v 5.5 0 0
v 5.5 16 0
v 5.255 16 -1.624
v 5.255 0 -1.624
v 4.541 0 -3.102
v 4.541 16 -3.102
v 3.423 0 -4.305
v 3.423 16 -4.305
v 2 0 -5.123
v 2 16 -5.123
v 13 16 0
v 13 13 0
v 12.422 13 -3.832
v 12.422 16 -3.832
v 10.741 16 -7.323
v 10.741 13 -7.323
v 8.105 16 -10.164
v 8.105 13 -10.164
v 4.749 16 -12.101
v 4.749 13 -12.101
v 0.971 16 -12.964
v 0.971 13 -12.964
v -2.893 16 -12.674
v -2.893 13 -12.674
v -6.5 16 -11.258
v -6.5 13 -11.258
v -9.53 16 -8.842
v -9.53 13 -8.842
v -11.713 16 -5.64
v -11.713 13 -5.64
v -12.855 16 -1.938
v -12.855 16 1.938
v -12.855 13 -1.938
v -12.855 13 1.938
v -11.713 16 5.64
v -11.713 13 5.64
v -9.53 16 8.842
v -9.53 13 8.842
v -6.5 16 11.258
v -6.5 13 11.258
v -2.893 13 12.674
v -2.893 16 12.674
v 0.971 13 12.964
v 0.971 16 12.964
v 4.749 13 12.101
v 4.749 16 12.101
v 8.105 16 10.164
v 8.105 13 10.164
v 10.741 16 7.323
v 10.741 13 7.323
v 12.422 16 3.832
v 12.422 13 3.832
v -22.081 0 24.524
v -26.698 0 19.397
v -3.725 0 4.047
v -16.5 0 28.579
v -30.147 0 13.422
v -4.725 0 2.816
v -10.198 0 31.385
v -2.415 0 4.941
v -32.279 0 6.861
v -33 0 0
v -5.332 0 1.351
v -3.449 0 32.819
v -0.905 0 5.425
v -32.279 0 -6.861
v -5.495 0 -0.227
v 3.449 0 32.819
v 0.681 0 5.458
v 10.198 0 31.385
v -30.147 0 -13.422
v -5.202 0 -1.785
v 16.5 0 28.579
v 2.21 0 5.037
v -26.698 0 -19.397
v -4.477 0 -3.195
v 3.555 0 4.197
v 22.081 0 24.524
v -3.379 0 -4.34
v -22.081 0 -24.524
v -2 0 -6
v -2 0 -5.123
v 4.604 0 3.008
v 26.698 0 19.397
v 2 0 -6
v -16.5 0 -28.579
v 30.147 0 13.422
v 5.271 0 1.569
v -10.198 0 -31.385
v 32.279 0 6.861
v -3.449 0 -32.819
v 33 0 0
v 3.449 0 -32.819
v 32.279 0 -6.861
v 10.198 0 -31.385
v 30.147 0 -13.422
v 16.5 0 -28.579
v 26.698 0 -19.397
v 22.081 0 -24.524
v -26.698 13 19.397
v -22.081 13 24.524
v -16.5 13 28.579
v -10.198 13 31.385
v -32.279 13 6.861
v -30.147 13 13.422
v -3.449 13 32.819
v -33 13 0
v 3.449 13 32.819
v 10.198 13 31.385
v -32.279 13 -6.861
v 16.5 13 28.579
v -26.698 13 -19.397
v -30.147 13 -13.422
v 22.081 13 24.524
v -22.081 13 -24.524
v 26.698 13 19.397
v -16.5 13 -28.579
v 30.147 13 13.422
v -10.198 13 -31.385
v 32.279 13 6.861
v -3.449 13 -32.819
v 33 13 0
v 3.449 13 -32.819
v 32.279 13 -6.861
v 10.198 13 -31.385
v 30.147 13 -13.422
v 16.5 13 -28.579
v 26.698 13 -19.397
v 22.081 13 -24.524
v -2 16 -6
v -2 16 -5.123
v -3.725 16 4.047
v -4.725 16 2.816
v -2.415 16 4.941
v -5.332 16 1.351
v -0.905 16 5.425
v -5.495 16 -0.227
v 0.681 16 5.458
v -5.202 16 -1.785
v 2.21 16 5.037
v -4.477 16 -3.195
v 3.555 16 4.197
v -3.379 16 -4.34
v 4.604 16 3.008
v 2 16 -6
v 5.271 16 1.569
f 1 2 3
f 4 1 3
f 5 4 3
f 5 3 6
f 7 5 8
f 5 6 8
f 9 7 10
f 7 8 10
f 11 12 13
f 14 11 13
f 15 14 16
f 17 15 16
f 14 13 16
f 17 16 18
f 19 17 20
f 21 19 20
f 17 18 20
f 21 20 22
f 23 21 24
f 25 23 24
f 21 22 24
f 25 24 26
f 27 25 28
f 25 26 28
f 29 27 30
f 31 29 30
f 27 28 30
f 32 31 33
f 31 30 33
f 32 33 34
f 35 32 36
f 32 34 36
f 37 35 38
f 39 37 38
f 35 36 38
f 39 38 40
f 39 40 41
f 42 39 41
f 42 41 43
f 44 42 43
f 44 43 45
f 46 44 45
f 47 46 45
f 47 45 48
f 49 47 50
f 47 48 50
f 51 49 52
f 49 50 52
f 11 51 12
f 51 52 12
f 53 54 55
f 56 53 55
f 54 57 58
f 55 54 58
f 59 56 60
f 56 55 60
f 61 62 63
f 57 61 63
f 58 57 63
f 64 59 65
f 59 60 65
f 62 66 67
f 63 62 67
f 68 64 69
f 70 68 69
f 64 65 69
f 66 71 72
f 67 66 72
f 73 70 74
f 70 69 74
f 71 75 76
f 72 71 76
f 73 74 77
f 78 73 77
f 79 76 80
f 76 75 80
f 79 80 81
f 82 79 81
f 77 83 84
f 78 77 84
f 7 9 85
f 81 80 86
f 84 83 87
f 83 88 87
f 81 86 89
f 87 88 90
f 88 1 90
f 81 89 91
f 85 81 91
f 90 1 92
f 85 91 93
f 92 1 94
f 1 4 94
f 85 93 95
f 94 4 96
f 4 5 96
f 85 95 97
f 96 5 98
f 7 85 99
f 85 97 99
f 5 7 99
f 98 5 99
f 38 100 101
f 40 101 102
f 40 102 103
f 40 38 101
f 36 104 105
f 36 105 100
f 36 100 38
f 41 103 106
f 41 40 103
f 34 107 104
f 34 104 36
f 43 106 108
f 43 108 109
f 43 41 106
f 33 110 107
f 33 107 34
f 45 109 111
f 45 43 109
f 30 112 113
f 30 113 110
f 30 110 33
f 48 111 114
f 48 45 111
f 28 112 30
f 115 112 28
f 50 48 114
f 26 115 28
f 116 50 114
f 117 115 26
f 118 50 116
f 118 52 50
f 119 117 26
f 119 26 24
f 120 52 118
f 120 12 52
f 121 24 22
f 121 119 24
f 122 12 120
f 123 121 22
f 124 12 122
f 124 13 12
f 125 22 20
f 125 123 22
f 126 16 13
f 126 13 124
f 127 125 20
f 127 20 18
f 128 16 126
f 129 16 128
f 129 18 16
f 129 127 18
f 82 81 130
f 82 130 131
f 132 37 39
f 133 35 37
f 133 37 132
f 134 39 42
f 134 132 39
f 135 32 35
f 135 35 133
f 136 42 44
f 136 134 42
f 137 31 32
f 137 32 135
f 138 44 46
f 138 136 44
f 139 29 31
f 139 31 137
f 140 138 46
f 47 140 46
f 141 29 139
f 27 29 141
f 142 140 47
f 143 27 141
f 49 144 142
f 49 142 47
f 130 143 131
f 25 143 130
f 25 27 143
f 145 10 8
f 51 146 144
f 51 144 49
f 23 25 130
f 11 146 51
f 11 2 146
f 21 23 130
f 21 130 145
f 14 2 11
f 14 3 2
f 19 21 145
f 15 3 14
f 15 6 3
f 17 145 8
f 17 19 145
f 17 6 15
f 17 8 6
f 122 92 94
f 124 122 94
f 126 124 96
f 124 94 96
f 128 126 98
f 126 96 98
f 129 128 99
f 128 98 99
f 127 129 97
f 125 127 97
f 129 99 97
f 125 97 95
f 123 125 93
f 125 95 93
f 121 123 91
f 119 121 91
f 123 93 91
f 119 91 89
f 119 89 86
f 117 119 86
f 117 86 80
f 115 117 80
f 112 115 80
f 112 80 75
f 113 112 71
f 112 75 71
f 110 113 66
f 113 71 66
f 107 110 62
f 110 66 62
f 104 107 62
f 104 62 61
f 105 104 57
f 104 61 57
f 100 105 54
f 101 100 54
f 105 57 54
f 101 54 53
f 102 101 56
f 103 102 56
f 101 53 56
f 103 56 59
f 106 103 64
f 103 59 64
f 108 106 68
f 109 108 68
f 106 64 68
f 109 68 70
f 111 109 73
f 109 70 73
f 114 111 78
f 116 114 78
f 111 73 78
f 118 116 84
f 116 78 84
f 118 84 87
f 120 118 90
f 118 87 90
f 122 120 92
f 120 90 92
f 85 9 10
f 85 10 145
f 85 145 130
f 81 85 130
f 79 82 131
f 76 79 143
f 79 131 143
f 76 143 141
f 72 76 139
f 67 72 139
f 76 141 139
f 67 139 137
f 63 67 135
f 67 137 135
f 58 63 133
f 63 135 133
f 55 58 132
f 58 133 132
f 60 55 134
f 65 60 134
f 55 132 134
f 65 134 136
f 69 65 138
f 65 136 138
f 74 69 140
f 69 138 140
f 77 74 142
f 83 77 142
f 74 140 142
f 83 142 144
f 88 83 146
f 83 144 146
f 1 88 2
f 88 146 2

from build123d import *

# Parameters (mm, degrees)
SKETCH1_R               = 33
BOSS_EXTRUDE1_DEPTH     = 13
SKETCH2_R               = 13
BOSS_EXTRUDE2_DEPTH     = 3
CUT_EXTRUDE1_DEPTH      = 1
CUT_EXTRUDE1_DEPTH_BACK = 17


with BuildPart() as part:
    # Sketch1 → Boss-Extrude1 (new body)
    with BuildSketch(Plane(origin=(0, 0, 0), x_dir=(1, 0, 0), z_dir=(0, 1, 0))):
        Circle(SKETCH1_R)
    extrude(amount=BOSS_EXTRUDE1_DEPTH)

    # Sketch2 → Boss-Extrude2 (add)
    with BuildSketch(Plane(origin=(0, 13, 0), x_dir=(1, 0, 0), z_dir=(0, 1, 0))):
        Circle(SKETCH2_R)
    extrude(amount=BOSS_EXTRUDE2_DEPTH)

    # Sketch3 → Cut-Extrude1 (cut, two sides)
    with BuildSketch(Plane(origin=(0, 16, 0), x_dir=(1, 0, 0), z_dir=(0, 1, 0))) as cut_extrude1_sk:
        with BuildLine():
            ThreePointArc((2, 5.123475383), (0, 5.5), (-2, 5.123475383))
            Line((-2, 5.123475383), (-2, 5))
            Line((-2, 5), (2, 5))
            Line((2, 5), (2, 5.123475383))
        make_face()
        with BuildLine():
            Line((-2, 5), (-2, 5.123475383))
            ThreePointArc((-2, 5.123475383), (-3.102418411, -4.541475531), (5.5, 0))
            ThreePointArc((5.5, 0), (4.541475531, 3.102418411), (2, 5.123475383))
            Line((2, 5.123475383), (2, 5))
            Line((2, 5), (-2, 5))
        make_face()
        with BuildLine():
            Line((2, 6), (-2, 6))
            Line((-2, 6), (-2, 5.123475383))
            ThreePointArc((-2, 5.123475383), (0, 5.5), (2, 5.123475383))
            Line((2, 5.123475383), (2, 6))
        make_face()
    extrude(amount=CUT_EXTRUDE1_DEPTH, mode=Mode.SUBTRACT)
    extrude(cut_extrude1_sk.sketch, amount=-CUT_EXTRUDE1_DEPTH_BACK, mode=Mode.SUBTRACT)


solid = part.part
